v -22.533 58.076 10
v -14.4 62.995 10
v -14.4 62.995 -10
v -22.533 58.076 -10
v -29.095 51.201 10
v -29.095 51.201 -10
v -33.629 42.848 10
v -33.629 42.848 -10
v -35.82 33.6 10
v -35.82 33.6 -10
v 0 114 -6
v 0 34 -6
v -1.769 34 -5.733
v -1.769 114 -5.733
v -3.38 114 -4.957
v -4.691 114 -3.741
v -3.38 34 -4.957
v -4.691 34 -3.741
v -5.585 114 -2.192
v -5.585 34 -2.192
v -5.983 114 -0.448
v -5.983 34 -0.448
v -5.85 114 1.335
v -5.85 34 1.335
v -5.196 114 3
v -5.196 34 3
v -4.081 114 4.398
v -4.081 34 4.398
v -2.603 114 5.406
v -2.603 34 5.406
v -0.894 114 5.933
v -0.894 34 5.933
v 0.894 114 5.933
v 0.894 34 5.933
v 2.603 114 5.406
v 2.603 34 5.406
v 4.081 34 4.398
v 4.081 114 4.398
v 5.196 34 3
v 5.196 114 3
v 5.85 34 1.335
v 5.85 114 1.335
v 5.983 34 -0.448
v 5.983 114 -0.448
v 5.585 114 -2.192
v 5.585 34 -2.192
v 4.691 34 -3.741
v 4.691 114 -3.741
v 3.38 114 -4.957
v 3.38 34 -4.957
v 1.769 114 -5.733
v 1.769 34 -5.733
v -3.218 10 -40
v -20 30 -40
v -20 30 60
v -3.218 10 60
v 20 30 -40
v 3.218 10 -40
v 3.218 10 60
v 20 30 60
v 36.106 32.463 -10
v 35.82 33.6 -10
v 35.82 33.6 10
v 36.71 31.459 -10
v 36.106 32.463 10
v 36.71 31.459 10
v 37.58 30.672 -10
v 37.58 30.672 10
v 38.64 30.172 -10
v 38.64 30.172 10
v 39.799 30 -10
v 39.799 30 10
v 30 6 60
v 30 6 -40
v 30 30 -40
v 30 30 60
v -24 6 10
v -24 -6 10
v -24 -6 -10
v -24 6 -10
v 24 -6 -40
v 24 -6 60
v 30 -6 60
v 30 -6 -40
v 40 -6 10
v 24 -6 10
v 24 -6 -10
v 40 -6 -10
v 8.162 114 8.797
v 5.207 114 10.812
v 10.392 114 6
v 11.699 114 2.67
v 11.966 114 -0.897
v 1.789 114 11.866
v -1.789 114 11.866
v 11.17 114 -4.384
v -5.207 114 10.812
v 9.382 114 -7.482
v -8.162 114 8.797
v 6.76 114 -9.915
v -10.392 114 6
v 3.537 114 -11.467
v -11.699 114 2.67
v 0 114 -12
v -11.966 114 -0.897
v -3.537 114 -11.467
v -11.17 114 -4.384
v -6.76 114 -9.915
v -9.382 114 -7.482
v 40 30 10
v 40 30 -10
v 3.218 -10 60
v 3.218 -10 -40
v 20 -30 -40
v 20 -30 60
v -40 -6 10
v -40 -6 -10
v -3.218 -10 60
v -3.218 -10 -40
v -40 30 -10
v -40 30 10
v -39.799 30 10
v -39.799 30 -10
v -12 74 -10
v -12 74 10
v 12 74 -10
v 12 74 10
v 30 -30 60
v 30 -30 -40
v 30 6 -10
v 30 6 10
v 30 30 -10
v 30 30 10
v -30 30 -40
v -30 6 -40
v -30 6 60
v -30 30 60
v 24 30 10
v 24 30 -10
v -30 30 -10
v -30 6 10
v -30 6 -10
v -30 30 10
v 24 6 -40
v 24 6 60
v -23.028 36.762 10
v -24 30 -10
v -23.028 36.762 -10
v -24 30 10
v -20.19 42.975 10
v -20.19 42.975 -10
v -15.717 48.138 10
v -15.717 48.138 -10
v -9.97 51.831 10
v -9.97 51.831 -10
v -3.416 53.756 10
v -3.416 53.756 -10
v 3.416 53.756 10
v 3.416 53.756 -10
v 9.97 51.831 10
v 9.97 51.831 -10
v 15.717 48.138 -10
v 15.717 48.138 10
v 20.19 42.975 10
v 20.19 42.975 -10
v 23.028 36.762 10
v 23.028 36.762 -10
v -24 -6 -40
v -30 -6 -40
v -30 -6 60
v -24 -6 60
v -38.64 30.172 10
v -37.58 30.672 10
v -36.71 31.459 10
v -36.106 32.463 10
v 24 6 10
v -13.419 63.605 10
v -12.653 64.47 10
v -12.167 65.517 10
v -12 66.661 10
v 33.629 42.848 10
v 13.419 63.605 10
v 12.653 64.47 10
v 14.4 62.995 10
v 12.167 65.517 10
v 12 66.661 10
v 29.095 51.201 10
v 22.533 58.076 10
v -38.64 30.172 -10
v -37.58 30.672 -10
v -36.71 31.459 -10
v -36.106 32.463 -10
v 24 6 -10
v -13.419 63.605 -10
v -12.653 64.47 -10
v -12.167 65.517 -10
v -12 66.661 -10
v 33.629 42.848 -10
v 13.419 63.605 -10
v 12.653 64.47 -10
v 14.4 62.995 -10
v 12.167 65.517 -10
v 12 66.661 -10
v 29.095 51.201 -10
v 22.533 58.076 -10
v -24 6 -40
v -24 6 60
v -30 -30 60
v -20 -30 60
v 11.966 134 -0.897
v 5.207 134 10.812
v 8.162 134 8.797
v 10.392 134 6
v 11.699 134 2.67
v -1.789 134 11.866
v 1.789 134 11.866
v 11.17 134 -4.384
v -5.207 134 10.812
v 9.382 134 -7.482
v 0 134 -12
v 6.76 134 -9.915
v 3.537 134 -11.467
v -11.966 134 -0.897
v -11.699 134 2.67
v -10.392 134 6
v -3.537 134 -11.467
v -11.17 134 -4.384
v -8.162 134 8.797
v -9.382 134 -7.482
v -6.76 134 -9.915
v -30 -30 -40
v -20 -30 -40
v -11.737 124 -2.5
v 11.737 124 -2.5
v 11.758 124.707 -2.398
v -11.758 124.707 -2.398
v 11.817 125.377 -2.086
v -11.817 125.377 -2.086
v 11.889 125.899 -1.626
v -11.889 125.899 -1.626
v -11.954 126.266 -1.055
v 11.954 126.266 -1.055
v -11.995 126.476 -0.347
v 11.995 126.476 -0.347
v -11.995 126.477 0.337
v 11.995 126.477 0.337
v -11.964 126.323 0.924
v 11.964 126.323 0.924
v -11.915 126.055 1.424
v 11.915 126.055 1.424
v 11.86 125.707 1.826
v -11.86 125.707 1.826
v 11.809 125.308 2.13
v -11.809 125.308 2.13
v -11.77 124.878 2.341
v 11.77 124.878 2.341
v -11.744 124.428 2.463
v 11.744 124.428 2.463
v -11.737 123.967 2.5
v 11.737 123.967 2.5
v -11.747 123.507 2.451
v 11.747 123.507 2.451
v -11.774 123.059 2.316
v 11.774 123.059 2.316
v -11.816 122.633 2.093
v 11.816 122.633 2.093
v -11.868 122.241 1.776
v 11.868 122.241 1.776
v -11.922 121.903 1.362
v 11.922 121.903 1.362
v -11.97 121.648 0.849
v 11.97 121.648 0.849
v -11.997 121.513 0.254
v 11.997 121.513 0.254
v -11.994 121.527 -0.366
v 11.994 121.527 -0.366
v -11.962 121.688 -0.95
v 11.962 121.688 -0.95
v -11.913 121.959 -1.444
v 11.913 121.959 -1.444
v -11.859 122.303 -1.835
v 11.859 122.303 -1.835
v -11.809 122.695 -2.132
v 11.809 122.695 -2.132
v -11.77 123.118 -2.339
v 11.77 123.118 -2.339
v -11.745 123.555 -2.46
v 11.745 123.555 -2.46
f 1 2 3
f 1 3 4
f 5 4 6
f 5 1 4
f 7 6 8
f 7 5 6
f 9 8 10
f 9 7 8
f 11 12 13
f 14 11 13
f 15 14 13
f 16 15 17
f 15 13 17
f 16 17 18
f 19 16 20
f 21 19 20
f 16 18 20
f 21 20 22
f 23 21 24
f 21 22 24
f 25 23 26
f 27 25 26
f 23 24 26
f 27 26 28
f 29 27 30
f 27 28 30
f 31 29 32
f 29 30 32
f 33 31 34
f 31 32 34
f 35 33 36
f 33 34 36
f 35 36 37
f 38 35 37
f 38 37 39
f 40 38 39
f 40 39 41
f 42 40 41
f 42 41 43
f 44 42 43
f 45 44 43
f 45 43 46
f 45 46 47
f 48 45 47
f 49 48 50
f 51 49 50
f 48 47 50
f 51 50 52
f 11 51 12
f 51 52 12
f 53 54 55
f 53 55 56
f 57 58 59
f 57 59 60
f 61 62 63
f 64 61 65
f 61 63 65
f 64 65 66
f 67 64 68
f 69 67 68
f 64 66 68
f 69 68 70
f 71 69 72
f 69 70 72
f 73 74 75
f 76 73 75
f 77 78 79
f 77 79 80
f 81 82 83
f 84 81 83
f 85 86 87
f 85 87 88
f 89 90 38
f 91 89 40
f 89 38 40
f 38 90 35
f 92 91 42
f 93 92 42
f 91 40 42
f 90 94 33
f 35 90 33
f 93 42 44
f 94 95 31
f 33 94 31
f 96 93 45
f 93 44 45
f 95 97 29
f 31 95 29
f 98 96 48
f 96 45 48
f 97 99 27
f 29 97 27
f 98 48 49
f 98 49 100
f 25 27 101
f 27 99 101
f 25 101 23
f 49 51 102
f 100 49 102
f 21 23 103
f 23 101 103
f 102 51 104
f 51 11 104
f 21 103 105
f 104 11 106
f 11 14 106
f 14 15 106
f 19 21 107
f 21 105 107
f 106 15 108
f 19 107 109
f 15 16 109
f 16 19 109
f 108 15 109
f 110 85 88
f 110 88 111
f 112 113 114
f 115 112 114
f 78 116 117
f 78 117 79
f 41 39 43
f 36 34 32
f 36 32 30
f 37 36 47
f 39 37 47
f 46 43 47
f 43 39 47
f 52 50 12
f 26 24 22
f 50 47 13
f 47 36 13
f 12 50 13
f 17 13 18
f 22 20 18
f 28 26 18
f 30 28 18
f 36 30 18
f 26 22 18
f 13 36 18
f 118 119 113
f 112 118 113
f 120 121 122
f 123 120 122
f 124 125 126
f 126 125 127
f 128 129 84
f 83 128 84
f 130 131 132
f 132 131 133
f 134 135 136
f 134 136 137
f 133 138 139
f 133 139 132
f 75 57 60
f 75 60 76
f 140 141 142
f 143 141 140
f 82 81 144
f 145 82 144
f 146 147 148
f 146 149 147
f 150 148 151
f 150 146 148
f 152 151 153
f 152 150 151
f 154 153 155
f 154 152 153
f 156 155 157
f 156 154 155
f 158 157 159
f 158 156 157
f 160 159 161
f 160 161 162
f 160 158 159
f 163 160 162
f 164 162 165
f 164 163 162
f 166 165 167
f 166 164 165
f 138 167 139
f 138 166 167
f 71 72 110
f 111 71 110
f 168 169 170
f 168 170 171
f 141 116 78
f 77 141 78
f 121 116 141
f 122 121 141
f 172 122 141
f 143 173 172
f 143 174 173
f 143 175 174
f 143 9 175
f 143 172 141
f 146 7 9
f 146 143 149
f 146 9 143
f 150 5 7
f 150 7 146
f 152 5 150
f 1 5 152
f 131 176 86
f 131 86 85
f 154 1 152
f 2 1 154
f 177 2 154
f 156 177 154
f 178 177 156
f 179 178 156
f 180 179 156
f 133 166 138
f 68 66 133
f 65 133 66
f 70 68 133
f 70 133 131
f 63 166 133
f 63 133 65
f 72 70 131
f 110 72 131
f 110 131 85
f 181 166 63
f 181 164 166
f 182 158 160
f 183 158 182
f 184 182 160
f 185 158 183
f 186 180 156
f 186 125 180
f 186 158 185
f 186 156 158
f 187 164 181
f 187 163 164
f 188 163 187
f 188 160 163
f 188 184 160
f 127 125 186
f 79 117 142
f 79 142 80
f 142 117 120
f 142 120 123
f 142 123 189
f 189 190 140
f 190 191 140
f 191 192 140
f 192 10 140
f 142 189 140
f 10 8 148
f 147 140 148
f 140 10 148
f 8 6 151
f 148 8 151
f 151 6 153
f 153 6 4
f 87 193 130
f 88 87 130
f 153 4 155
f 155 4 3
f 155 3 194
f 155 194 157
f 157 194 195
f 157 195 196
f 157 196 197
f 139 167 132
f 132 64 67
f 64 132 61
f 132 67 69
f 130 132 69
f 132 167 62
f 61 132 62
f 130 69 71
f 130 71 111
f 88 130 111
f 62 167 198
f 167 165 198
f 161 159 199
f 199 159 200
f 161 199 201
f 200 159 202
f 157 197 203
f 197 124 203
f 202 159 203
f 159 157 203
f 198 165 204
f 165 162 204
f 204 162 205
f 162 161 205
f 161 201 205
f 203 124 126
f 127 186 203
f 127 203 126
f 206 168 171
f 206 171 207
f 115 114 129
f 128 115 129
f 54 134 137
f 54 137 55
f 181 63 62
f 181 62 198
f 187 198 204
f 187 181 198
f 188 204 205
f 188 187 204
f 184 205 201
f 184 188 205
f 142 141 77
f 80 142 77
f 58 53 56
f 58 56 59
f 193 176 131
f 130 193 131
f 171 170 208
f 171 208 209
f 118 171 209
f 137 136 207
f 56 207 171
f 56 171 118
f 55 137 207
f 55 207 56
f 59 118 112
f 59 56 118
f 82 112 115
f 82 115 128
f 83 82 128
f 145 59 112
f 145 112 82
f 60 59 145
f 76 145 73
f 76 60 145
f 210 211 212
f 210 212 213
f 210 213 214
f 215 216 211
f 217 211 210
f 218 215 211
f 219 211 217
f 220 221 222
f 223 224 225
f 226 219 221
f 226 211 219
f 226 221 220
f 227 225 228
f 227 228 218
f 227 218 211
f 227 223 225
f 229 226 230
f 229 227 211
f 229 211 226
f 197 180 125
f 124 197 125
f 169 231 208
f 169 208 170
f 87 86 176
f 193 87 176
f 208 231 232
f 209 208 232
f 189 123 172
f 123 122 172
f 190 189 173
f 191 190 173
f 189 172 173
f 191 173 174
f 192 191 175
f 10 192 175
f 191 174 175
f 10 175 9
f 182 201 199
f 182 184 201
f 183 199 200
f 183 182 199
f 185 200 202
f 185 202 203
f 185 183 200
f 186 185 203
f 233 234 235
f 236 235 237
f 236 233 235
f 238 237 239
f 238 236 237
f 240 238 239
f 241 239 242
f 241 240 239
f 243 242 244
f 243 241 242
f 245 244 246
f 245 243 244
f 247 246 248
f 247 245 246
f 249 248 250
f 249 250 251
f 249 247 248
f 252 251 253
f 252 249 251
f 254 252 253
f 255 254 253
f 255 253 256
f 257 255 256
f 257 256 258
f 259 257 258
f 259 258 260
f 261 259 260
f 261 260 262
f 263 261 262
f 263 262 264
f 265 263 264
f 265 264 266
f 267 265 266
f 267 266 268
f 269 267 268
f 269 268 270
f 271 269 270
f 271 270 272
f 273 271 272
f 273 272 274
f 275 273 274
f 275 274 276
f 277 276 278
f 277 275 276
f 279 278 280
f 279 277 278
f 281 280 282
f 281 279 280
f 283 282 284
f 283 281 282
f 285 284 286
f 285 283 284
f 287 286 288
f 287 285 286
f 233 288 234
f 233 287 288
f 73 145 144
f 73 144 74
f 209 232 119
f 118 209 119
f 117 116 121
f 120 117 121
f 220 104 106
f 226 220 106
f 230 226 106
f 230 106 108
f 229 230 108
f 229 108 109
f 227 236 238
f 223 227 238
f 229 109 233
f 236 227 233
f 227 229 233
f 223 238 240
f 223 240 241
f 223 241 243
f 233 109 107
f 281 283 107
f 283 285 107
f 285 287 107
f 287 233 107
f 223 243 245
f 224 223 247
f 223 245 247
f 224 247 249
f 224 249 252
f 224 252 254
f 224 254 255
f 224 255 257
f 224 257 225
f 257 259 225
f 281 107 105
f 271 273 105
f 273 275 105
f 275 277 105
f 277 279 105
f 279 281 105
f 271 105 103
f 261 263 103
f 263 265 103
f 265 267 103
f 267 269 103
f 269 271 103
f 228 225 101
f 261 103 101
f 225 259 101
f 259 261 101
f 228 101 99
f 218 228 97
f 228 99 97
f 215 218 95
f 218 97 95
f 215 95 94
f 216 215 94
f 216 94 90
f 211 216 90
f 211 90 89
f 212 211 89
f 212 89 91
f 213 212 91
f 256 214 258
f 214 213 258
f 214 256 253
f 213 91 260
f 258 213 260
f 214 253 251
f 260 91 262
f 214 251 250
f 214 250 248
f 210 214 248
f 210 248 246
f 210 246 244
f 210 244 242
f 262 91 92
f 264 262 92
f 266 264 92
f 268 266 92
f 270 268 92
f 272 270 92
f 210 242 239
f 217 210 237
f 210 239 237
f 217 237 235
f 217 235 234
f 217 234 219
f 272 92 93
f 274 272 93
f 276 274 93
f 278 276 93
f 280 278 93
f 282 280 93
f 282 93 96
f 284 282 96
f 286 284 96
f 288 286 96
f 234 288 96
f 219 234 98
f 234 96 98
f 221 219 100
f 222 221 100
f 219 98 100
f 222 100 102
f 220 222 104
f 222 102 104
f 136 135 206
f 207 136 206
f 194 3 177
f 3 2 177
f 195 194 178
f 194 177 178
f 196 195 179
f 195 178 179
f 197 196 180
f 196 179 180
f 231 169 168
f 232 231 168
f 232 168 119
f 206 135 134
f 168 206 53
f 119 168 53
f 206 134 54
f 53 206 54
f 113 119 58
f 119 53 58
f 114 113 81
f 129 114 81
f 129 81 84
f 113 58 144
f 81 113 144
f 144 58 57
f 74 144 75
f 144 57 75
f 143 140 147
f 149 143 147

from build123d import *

# Parameters (mm, degrees)
BOSS_EXTRUDE1_DEPTH      = 60
BOSS_EXTRUDE1_DEPTH_BACK = 40
SKETCH2_W                = 60
SKETCH2_H                = 60
CUT_EXTRUDE1_DEPTH       = 109.627804912
CUT_EXTRUDE1_DEPTH_BACK  = 109.627804912
SKETCH3_W                = 16
SKETCH3_H                = 12
CUT_EXTRUDE2_DEPTH       = 74.484692283
CUT_EXTRUDE2_DEPTH_BACK  = 74.484692283
SKETCH5_W                = 16
SKETCH5_H                = 12
BOSS_EXTRUDE2_DEPTH      = 10
BOSS_EXTRUDE2_2_DEPTH    = 10
SKETCH7_W                = 10
SKETCH7_H                = 24
BOSS_EXTRUDE3_DEPTH      = 10
BOSS_EXTRUDE3_2_DEPTH    = 10
BOSS_EXTRUDE4_DEPTH      = 10
SKETCH10_W               = 24
SKETCH10_H               = 16
BOSS_EXTRUDE5_DEPTH      = 10
FILLET1_R                = 4
BOSS_EXTRUDE6_DEPTH      = 40
BOSS_EXTRUDE6_DEPTH_BACK = 40
BOSS_EXTRUDE6_START      = 74
SKETCH11_R               = 6
BOSS_EXTRUDE7_START      = 114
SKETCH12_R               = 12
BOSS_EXTRUDE7_DEPTH      = 20
CUT_EXTRUDE4_DEPTH       = 153.170956493
CUT_EXTRUDE4_DEPTH_BACK  = 153.170956493
SKETCH13_R               = 2.5


with BuildPart() as part:
    # Sketch2 → Boss-Extrude1 (new, two sides: drawn at the far end of the back side and taken through both)
    with BuildSketch(Plane.XY.offset(-BOSS_EXTRUDE1_DEPTH_BACK)):
        Rectangle(SKETCH2_W, SKETCH2_H)
    extrude(amount=BOSS_EXTRUDE1_DEPTH + BOSS_EXTRUDE1_DEPTH_BACK)

    # Sketch3 → Cut-Extrude1 (cut, two sides: drawn at the far end of the back side and taken through both)
    with BuildSketch(Plane.XY.offset(60).offset(-CUT_EXTRUDE1_DEPTH_BACK)):
        with Locations((32, 0)):
            Rectangle(SKETCH3_W, SKETCH3_H)
        with Locations((-32, 0)):
            Rectangle(SKETCH3_W, SKETCH3_H)
    extrude(amount=CUT_EXTRUDE1_DEPTH + CUT_EXTRUDE1_DEPTH_BACK, mode=Mode.SUBTRACT)

    # Sketch4 → Cut-Extrude2 (cut, two sides: drawn at the far end of the back side and taken through both)
    with BuildSketch(Plane.XY.offset(-CUT_EXTRUDE2_DEPTH_BACK)):
        Polygon((-20, -30), (-3.218007376, -10), (3.218007376, -10), (20, -30), (20, -54.733216857), (-20, -54.733216857), align=None)
        Polygon((-20, 30), (-3.218007376, 10), (3.218007376, 10), (20, 30), (20, 60.547100054), (-20, 60.547100054), align=None)
    extrude(amount=CUT_EXTRUDE2_DEPTH + CUT_EXTRUDE2_DEPTH_BACK, mode=Mode.SUBTRACT)


with BuildPart() as body_2:
    # Sketch5 → Boss-Extrude2 (new, symmetric)
    with BuildSketch(Plane.XY):
        with Locations((32, 0)):
            Rectangle(SKETCH5_W, SKETCH5_H)
    extrude(amount=BOSS_EXTRUDE2_DEPTH, both=True)


with BuildPart() as body_3:
    # Sketch5 → Boss-Extrude2 2 (new, symmetric)
    with BuildSketch(Plane.XY):
        with Locations((-32, 0)):
            Rectangle(SKETCH5_W, SKETCH5_H)
    extrude(amount=BOSS_EXTRUDE2_2_DEPTH, both=True)


with BuildPart() as body_4:
    # Sketch7 → Boss-Extrude3 (new, symmetric)
    with BuildSketch(Plane.XY):
        with Locations((-35, 18)):
            Rectangle(SKETCH7_W, SKETCH7_H)
    extrude(amount=BOSS_EXTRUDE3_DEPTH, both=True)


with BuildPart() as body_5:
    # Sketch7 → Boss-Extrude3 2 (new, symmetric)
    with BuildSketch(Plane.XY):
        with Locations((35, 18)):
            Rectangle(SKETCH7_W, SKETCH7_H)
    extrude(amount=BOSS_EXTRUDE3_2_DEPTH, both=True)


with BuildPart() as body_6:
    # Sketch8 → Boss-Extrude4 (new, symmetric)
    with BuildSketch(Plane.XY):
        with BuildLine():
            Line((24, 30), (36, 30))
            ThreePointArc((36, 30), (0, 66), (-36, 30))
            Line((-36, 30), (-24, 30))
            ThreePointArc((-24, 30), (0, 54), (24, 30))
        make_face()
    extrude(amount=BOSS_EXTRUDE4_DEPTH, both=True)

    # Combine1: union body 5, body 4, body 3, body 2
    add(body_5.part)
    add(body_4.part)
    add(body_3.part)
    add(body_2.part)

    # Sketch10 → Boss-Extrude5 (add, symmetric)
    with BuildSketch(Plane.XY):
        with Locations((0, 66)):
            Rectangle(SKETCH10_W, SKETCH10_H)
    extrude(amount=BOSS_EXTRUDE5_DEPTH, both=True)

    # Fillet1
    fillet1_edges = [body_6.edges().sort_by_distance(p)[0] for p in [
        (12, 63.941125497, 0),
        (-12, 63.941125497, 0),
        (-36, 30, 0),
        (36, 30, 0),
    ]]
    fillet(fillet1_edges, radius=FILLET1_R)


with BuildPart() as body_3_2:
    # Sketch11 → Boss-Extrude6 (new, two sides: drawn at the far end of the back side and taken through both)
    with BuildSketch(Plane(origin=(0, 0, 0), x_dir=(1, 0, 0), z_dir=(0, 1, 0)).offset(BOSS_EXTRUDE6_START - BOSS_EXTRUDE6_DEPTH_BACK)):
        with Locations(Location((0, 0, 0), (0, 0, 90))):
            Circle(SKETCH11_R)
    extrude(amount=BOSS_EXTRUDE6_DEPTH + BOSS_EXTRUDE6_DEPTH_BACK)


with BuildPart() as body_4_2:
    # Sketch12 → Boss-Extrude7 (new body)
    with BuildSketch(Plane(origin=(0, 0, 0), x_dir=(1, 0, 0), z_dir=(0, 1, 0)).offset(BOSS_EXTRUDE7_START)):
        with Locations(Location((0, 0, 0), (0, 0, 90))):
            Circle(SKETCH12_R)
    extrude(amount=BOSS_EXTRUDE7_DEPTH)

    # Combine2: union body 3 2
    add(body_3_2.part)

    # Sketch13 → Cut-Extrude4 (cut, two sides: drawn at the far end of the back side and taken through both)
    with BuildSketch(Plane(origin=(0, 0, 0), x_dir=(0, 0, -1), z_dir=(1, 0, 0)).offset(-CUT_EXTRUDE4_DEPTH_BACK)):
        with Locations((0, 124)):
            Circle(SKETCH13_R)
    extrude(amount=CUT_EXTRUDE4_DEPTH + CUT_EXTRUDE4_DEPTH_BACK, mode=Mode.SUBTRACT)


solid = Compound([part.part, body_6.part, body_4_2.part])
